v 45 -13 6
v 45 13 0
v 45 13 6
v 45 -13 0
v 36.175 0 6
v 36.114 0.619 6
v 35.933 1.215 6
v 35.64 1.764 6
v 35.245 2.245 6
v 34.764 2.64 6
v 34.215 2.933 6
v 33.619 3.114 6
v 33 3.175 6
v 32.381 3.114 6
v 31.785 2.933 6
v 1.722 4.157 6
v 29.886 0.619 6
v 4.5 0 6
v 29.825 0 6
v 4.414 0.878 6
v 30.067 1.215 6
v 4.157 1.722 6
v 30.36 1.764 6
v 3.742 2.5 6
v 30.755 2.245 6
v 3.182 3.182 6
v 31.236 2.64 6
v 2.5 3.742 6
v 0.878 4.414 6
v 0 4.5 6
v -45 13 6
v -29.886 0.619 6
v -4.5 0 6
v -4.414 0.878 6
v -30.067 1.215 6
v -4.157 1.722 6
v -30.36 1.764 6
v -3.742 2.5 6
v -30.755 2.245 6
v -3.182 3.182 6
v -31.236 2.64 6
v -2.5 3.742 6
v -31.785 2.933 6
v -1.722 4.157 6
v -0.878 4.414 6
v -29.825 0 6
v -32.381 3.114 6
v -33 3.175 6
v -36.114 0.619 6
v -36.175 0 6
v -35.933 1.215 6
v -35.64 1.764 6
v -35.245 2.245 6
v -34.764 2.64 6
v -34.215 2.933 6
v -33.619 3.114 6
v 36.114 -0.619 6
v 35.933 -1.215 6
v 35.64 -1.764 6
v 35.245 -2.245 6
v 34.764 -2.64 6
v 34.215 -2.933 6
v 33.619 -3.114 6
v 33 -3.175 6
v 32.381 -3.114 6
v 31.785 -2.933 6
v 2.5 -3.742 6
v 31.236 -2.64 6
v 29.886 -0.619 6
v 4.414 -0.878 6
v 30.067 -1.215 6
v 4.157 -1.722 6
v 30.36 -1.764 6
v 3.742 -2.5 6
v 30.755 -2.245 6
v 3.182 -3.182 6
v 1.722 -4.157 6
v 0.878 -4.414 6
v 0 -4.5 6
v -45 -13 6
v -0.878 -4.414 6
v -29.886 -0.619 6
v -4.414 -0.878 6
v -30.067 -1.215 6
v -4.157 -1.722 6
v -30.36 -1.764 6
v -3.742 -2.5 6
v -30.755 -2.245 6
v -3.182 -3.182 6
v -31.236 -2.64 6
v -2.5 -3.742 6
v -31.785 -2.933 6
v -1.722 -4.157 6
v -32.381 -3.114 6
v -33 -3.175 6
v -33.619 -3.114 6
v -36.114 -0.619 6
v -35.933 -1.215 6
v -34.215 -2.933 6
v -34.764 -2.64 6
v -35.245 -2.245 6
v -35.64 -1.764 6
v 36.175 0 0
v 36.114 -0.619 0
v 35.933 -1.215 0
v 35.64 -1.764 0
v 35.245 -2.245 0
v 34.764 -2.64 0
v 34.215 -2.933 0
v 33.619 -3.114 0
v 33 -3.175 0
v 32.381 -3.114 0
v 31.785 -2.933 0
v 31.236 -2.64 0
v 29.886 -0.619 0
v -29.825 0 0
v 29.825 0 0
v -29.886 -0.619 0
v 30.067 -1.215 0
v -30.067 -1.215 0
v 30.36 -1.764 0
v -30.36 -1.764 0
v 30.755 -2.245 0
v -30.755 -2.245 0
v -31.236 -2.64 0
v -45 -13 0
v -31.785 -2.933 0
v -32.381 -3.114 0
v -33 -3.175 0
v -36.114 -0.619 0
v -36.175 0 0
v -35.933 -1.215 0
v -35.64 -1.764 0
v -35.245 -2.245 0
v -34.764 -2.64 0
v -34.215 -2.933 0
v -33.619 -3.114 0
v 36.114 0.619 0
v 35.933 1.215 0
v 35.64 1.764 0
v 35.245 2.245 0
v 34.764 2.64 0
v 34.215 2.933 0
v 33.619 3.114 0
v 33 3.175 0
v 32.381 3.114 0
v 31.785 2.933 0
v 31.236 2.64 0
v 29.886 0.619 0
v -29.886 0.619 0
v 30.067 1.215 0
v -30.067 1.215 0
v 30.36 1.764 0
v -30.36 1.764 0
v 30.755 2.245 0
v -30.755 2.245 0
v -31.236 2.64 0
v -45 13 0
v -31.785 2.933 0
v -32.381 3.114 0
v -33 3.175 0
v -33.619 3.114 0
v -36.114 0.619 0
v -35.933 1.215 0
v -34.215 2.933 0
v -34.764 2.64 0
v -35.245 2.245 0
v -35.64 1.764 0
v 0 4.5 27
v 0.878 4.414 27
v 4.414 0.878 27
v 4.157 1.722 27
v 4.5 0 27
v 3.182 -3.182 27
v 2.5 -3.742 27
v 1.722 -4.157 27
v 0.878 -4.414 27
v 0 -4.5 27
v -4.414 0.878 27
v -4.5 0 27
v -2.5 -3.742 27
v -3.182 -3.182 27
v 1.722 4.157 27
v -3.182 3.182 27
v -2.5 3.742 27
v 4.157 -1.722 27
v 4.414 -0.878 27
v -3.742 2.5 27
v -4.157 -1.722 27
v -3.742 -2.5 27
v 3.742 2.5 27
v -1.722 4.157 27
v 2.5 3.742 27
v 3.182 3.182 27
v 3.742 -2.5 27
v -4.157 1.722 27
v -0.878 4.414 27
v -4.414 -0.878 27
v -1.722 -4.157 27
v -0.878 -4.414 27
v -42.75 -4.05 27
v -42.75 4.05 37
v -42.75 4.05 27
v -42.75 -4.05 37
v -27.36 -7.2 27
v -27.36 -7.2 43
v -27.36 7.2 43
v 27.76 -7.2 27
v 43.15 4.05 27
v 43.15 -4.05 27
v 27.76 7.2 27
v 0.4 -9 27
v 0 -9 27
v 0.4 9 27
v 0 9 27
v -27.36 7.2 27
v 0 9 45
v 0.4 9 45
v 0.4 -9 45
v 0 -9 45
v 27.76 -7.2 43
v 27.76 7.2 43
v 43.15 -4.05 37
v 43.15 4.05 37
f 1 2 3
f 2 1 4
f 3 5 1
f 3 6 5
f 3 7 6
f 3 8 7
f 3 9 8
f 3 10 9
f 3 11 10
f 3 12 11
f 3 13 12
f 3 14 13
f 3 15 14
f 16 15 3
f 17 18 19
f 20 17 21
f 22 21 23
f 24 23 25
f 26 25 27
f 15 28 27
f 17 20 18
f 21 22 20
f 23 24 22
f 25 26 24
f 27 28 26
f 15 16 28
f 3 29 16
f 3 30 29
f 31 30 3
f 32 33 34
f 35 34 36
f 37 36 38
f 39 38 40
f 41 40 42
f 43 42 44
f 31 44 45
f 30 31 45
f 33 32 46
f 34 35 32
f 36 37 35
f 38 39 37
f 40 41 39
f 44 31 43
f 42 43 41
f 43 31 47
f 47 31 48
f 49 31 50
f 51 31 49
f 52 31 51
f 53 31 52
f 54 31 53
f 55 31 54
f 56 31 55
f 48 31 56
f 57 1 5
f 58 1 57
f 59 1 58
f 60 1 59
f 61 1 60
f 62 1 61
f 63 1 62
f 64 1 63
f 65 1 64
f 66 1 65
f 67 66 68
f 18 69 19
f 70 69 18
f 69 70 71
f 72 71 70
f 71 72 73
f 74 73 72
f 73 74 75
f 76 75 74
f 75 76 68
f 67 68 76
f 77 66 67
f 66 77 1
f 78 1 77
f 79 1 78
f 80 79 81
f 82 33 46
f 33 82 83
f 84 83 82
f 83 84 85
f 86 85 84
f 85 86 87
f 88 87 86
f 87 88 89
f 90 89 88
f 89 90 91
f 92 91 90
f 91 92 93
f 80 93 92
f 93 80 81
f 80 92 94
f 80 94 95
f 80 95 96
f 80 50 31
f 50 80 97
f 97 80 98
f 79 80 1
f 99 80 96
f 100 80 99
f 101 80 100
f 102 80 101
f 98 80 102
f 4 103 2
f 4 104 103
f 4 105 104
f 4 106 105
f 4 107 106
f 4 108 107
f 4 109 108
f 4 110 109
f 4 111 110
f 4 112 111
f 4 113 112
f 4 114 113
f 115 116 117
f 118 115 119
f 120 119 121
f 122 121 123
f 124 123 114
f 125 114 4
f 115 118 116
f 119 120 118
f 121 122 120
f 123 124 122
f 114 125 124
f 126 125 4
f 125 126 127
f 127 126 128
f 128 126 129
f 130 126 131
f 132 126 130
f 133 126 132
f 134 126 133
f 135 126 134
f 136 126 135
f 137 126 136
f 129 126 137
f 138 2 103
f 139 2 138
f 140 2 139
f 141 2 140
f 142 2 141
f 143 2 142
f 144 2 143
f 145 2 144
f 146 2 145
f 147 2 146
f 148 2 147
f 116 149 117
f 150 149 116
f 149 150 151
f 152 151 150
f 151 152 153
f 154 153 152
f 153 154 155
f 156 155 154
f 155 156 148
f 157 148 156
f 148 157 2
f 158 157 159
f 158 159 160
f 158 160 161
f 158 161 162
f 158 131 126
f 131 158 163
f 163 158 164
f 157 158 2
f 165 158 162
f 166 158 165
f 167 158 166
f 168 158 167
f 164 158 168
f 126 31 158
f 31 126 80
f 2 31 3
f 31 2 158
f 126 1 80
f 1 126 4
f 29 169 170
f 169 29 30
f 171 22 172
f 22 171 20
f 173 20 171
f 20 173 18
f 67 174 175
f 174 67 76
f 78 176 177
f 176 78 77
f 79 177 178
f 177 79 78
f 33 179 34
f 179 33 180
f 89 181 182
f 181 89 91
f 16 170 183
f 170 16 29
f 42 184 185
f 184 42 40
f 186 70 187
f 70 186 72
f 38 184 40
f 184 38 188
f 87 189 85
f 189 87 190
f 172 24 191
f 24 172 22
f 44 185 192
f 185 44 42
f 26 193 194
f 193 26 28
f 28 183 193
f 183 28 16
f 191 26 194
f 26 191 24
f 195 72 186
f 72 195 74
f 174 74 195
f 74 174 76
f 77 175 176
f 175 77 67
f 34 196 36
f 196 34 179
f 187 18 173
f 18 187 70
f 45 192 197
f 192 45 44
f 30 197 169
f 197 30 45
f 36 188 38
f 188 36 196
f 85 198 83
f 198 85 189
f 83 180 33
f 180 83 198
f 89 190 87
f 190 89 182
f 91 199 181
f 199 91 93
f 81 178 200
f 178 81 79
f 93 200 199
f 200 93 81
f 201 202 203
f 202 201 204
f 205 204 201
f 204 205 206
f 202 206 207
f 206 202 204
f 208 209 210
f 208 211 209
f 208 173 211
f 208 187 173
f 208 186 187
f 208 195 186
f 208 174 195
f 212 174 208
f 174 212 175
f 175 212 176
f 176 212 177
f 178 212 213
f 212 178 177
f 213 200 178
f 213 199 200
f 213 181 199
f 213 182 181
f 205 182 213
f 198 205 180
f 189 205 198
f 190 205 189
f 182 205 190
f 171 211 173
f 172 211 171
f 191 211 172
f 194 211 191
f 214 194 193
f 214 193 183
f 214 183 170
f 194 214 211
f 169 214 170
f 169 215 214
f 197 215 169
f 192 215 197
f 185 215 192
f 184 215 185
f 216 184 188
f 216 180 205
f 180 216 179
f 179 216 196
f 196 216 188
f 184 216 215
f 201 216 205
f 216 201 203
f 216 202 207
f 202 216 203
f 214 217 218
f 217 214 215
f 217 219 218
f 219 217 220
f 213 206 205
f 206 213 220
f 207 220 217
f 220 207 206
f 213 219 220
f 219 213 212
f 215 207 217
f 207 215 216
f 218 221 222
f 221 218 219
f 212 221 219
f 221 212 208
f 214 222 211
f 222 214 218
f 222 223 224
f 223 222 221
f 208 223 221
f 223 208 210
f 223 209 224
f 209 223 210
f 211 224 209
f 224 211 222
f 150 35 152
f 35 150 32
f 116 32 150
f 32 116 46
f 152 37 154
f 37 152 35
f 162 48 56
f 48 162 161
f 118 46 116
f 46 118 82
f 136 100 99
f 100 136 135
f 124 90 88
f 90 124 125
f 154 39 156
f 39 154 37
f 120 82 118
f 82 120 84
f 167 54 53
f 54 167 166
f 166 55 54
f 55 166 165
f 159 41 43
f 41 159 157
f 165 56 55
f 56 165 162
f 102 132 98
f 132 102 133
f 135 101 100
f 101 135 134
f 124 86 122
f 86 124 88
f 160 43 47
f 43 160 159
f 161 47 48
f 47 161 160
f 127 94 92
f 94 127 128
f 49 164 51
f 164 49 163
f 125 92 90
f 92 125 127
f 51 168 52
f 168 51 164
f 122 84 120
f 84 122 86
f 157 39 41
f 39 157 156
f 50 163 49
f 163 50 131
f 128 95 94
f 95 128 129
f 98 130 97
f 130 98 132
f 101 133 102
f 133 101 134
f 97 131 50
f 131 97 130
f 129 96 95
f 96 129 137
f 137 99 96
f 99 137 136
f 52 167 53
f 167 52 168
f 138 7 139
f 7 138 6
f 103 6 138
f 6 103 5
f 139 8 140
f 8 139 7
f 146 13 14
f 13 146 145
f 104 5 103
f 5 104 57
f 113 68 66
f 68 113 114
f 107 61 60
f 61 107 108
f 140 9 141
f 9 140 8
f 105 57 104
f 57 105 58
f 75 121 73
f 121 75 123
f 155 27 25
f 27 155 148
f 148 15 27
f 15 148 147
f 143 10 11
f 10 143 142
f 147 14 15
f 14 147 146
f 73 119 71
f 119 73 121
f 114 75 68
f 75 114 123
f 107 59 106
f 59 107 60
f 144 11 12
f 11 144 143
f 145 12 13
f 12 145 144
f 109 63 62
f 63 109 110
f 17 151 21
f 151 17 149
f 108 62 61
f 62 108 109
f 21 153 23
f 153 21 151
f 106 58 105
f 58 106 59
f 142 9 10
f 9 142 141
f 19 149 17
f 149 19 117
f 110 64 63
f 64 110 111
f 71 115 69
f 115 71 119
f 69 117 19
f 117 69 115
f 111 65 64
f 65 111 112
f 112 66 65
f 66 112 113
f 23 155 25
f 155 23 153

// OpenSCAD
$fn = 32;

// ----------------------------------------------------------------------
// Boat cleat: 90 mm base, horn 36 mm up
// ----------------------------------------------------------------------

// --- parameters (mm) ---
base_l = 90;              // base length
base_w = 26;              // base width
base_t = 6;               // base thickness
horn_len = 85.5;          // horn length
horn_d = 18;              // horn diameter at the middle
horn_z = 36;              // horn axis height
end_drop = 8;             // how far the horn tips drop
post_d = 9;               // centre post diameter
holes_d = 6.35;           // fixing holes
hole_x = 33;              // fixing hole spacing

difference() {
  union() {
    translate([-45, -13, 0]) cube([base_l, base_w, base_t]);
    /* centre post, sunk 1 mm into the base */
    translate([0, 0, 5]) cylinder(h = 31, d = post_d);
    /* horn: a hull chain of boxes, full in the middle and lighter at the tips */
    hull() {
      translate([-42.75, -4.05, 27]) cube([0.4, 8.1, 10], center = false);
      translate([-27.36, -7.2, 27]) cube([0.4, 14.4, 16], center = false);
    }
    hull() {
      translate([-27.36, -7.2, 27]) cube([0.4, 14.4, 16], center = false);
      translate([0, -9, 27]) cube([0.4, 18, 18], center = false);
    }
    hull() {
      translate([0, -9, 27]) cube([0.4, 18, 18], center = false);
      translate([27.36, -7.2, 27]) cube([0.4, 14.4, 16], center = false);
    }
    hull() {
      translate([27.36, -7.2, 27]) cube([0.4, 14.4, 16], center = false);
      translate([42.75, -4.05, 27]) cube([0.4, 8.1, 10], center = false);
    }
  }
  translate([-33, 0, -2.5]) cylinder(h = base_t + 5, d = holes_d);
  translate([33, 0, -2.5]) cylinder(h = base_t + 5, d = holes_d);
}
